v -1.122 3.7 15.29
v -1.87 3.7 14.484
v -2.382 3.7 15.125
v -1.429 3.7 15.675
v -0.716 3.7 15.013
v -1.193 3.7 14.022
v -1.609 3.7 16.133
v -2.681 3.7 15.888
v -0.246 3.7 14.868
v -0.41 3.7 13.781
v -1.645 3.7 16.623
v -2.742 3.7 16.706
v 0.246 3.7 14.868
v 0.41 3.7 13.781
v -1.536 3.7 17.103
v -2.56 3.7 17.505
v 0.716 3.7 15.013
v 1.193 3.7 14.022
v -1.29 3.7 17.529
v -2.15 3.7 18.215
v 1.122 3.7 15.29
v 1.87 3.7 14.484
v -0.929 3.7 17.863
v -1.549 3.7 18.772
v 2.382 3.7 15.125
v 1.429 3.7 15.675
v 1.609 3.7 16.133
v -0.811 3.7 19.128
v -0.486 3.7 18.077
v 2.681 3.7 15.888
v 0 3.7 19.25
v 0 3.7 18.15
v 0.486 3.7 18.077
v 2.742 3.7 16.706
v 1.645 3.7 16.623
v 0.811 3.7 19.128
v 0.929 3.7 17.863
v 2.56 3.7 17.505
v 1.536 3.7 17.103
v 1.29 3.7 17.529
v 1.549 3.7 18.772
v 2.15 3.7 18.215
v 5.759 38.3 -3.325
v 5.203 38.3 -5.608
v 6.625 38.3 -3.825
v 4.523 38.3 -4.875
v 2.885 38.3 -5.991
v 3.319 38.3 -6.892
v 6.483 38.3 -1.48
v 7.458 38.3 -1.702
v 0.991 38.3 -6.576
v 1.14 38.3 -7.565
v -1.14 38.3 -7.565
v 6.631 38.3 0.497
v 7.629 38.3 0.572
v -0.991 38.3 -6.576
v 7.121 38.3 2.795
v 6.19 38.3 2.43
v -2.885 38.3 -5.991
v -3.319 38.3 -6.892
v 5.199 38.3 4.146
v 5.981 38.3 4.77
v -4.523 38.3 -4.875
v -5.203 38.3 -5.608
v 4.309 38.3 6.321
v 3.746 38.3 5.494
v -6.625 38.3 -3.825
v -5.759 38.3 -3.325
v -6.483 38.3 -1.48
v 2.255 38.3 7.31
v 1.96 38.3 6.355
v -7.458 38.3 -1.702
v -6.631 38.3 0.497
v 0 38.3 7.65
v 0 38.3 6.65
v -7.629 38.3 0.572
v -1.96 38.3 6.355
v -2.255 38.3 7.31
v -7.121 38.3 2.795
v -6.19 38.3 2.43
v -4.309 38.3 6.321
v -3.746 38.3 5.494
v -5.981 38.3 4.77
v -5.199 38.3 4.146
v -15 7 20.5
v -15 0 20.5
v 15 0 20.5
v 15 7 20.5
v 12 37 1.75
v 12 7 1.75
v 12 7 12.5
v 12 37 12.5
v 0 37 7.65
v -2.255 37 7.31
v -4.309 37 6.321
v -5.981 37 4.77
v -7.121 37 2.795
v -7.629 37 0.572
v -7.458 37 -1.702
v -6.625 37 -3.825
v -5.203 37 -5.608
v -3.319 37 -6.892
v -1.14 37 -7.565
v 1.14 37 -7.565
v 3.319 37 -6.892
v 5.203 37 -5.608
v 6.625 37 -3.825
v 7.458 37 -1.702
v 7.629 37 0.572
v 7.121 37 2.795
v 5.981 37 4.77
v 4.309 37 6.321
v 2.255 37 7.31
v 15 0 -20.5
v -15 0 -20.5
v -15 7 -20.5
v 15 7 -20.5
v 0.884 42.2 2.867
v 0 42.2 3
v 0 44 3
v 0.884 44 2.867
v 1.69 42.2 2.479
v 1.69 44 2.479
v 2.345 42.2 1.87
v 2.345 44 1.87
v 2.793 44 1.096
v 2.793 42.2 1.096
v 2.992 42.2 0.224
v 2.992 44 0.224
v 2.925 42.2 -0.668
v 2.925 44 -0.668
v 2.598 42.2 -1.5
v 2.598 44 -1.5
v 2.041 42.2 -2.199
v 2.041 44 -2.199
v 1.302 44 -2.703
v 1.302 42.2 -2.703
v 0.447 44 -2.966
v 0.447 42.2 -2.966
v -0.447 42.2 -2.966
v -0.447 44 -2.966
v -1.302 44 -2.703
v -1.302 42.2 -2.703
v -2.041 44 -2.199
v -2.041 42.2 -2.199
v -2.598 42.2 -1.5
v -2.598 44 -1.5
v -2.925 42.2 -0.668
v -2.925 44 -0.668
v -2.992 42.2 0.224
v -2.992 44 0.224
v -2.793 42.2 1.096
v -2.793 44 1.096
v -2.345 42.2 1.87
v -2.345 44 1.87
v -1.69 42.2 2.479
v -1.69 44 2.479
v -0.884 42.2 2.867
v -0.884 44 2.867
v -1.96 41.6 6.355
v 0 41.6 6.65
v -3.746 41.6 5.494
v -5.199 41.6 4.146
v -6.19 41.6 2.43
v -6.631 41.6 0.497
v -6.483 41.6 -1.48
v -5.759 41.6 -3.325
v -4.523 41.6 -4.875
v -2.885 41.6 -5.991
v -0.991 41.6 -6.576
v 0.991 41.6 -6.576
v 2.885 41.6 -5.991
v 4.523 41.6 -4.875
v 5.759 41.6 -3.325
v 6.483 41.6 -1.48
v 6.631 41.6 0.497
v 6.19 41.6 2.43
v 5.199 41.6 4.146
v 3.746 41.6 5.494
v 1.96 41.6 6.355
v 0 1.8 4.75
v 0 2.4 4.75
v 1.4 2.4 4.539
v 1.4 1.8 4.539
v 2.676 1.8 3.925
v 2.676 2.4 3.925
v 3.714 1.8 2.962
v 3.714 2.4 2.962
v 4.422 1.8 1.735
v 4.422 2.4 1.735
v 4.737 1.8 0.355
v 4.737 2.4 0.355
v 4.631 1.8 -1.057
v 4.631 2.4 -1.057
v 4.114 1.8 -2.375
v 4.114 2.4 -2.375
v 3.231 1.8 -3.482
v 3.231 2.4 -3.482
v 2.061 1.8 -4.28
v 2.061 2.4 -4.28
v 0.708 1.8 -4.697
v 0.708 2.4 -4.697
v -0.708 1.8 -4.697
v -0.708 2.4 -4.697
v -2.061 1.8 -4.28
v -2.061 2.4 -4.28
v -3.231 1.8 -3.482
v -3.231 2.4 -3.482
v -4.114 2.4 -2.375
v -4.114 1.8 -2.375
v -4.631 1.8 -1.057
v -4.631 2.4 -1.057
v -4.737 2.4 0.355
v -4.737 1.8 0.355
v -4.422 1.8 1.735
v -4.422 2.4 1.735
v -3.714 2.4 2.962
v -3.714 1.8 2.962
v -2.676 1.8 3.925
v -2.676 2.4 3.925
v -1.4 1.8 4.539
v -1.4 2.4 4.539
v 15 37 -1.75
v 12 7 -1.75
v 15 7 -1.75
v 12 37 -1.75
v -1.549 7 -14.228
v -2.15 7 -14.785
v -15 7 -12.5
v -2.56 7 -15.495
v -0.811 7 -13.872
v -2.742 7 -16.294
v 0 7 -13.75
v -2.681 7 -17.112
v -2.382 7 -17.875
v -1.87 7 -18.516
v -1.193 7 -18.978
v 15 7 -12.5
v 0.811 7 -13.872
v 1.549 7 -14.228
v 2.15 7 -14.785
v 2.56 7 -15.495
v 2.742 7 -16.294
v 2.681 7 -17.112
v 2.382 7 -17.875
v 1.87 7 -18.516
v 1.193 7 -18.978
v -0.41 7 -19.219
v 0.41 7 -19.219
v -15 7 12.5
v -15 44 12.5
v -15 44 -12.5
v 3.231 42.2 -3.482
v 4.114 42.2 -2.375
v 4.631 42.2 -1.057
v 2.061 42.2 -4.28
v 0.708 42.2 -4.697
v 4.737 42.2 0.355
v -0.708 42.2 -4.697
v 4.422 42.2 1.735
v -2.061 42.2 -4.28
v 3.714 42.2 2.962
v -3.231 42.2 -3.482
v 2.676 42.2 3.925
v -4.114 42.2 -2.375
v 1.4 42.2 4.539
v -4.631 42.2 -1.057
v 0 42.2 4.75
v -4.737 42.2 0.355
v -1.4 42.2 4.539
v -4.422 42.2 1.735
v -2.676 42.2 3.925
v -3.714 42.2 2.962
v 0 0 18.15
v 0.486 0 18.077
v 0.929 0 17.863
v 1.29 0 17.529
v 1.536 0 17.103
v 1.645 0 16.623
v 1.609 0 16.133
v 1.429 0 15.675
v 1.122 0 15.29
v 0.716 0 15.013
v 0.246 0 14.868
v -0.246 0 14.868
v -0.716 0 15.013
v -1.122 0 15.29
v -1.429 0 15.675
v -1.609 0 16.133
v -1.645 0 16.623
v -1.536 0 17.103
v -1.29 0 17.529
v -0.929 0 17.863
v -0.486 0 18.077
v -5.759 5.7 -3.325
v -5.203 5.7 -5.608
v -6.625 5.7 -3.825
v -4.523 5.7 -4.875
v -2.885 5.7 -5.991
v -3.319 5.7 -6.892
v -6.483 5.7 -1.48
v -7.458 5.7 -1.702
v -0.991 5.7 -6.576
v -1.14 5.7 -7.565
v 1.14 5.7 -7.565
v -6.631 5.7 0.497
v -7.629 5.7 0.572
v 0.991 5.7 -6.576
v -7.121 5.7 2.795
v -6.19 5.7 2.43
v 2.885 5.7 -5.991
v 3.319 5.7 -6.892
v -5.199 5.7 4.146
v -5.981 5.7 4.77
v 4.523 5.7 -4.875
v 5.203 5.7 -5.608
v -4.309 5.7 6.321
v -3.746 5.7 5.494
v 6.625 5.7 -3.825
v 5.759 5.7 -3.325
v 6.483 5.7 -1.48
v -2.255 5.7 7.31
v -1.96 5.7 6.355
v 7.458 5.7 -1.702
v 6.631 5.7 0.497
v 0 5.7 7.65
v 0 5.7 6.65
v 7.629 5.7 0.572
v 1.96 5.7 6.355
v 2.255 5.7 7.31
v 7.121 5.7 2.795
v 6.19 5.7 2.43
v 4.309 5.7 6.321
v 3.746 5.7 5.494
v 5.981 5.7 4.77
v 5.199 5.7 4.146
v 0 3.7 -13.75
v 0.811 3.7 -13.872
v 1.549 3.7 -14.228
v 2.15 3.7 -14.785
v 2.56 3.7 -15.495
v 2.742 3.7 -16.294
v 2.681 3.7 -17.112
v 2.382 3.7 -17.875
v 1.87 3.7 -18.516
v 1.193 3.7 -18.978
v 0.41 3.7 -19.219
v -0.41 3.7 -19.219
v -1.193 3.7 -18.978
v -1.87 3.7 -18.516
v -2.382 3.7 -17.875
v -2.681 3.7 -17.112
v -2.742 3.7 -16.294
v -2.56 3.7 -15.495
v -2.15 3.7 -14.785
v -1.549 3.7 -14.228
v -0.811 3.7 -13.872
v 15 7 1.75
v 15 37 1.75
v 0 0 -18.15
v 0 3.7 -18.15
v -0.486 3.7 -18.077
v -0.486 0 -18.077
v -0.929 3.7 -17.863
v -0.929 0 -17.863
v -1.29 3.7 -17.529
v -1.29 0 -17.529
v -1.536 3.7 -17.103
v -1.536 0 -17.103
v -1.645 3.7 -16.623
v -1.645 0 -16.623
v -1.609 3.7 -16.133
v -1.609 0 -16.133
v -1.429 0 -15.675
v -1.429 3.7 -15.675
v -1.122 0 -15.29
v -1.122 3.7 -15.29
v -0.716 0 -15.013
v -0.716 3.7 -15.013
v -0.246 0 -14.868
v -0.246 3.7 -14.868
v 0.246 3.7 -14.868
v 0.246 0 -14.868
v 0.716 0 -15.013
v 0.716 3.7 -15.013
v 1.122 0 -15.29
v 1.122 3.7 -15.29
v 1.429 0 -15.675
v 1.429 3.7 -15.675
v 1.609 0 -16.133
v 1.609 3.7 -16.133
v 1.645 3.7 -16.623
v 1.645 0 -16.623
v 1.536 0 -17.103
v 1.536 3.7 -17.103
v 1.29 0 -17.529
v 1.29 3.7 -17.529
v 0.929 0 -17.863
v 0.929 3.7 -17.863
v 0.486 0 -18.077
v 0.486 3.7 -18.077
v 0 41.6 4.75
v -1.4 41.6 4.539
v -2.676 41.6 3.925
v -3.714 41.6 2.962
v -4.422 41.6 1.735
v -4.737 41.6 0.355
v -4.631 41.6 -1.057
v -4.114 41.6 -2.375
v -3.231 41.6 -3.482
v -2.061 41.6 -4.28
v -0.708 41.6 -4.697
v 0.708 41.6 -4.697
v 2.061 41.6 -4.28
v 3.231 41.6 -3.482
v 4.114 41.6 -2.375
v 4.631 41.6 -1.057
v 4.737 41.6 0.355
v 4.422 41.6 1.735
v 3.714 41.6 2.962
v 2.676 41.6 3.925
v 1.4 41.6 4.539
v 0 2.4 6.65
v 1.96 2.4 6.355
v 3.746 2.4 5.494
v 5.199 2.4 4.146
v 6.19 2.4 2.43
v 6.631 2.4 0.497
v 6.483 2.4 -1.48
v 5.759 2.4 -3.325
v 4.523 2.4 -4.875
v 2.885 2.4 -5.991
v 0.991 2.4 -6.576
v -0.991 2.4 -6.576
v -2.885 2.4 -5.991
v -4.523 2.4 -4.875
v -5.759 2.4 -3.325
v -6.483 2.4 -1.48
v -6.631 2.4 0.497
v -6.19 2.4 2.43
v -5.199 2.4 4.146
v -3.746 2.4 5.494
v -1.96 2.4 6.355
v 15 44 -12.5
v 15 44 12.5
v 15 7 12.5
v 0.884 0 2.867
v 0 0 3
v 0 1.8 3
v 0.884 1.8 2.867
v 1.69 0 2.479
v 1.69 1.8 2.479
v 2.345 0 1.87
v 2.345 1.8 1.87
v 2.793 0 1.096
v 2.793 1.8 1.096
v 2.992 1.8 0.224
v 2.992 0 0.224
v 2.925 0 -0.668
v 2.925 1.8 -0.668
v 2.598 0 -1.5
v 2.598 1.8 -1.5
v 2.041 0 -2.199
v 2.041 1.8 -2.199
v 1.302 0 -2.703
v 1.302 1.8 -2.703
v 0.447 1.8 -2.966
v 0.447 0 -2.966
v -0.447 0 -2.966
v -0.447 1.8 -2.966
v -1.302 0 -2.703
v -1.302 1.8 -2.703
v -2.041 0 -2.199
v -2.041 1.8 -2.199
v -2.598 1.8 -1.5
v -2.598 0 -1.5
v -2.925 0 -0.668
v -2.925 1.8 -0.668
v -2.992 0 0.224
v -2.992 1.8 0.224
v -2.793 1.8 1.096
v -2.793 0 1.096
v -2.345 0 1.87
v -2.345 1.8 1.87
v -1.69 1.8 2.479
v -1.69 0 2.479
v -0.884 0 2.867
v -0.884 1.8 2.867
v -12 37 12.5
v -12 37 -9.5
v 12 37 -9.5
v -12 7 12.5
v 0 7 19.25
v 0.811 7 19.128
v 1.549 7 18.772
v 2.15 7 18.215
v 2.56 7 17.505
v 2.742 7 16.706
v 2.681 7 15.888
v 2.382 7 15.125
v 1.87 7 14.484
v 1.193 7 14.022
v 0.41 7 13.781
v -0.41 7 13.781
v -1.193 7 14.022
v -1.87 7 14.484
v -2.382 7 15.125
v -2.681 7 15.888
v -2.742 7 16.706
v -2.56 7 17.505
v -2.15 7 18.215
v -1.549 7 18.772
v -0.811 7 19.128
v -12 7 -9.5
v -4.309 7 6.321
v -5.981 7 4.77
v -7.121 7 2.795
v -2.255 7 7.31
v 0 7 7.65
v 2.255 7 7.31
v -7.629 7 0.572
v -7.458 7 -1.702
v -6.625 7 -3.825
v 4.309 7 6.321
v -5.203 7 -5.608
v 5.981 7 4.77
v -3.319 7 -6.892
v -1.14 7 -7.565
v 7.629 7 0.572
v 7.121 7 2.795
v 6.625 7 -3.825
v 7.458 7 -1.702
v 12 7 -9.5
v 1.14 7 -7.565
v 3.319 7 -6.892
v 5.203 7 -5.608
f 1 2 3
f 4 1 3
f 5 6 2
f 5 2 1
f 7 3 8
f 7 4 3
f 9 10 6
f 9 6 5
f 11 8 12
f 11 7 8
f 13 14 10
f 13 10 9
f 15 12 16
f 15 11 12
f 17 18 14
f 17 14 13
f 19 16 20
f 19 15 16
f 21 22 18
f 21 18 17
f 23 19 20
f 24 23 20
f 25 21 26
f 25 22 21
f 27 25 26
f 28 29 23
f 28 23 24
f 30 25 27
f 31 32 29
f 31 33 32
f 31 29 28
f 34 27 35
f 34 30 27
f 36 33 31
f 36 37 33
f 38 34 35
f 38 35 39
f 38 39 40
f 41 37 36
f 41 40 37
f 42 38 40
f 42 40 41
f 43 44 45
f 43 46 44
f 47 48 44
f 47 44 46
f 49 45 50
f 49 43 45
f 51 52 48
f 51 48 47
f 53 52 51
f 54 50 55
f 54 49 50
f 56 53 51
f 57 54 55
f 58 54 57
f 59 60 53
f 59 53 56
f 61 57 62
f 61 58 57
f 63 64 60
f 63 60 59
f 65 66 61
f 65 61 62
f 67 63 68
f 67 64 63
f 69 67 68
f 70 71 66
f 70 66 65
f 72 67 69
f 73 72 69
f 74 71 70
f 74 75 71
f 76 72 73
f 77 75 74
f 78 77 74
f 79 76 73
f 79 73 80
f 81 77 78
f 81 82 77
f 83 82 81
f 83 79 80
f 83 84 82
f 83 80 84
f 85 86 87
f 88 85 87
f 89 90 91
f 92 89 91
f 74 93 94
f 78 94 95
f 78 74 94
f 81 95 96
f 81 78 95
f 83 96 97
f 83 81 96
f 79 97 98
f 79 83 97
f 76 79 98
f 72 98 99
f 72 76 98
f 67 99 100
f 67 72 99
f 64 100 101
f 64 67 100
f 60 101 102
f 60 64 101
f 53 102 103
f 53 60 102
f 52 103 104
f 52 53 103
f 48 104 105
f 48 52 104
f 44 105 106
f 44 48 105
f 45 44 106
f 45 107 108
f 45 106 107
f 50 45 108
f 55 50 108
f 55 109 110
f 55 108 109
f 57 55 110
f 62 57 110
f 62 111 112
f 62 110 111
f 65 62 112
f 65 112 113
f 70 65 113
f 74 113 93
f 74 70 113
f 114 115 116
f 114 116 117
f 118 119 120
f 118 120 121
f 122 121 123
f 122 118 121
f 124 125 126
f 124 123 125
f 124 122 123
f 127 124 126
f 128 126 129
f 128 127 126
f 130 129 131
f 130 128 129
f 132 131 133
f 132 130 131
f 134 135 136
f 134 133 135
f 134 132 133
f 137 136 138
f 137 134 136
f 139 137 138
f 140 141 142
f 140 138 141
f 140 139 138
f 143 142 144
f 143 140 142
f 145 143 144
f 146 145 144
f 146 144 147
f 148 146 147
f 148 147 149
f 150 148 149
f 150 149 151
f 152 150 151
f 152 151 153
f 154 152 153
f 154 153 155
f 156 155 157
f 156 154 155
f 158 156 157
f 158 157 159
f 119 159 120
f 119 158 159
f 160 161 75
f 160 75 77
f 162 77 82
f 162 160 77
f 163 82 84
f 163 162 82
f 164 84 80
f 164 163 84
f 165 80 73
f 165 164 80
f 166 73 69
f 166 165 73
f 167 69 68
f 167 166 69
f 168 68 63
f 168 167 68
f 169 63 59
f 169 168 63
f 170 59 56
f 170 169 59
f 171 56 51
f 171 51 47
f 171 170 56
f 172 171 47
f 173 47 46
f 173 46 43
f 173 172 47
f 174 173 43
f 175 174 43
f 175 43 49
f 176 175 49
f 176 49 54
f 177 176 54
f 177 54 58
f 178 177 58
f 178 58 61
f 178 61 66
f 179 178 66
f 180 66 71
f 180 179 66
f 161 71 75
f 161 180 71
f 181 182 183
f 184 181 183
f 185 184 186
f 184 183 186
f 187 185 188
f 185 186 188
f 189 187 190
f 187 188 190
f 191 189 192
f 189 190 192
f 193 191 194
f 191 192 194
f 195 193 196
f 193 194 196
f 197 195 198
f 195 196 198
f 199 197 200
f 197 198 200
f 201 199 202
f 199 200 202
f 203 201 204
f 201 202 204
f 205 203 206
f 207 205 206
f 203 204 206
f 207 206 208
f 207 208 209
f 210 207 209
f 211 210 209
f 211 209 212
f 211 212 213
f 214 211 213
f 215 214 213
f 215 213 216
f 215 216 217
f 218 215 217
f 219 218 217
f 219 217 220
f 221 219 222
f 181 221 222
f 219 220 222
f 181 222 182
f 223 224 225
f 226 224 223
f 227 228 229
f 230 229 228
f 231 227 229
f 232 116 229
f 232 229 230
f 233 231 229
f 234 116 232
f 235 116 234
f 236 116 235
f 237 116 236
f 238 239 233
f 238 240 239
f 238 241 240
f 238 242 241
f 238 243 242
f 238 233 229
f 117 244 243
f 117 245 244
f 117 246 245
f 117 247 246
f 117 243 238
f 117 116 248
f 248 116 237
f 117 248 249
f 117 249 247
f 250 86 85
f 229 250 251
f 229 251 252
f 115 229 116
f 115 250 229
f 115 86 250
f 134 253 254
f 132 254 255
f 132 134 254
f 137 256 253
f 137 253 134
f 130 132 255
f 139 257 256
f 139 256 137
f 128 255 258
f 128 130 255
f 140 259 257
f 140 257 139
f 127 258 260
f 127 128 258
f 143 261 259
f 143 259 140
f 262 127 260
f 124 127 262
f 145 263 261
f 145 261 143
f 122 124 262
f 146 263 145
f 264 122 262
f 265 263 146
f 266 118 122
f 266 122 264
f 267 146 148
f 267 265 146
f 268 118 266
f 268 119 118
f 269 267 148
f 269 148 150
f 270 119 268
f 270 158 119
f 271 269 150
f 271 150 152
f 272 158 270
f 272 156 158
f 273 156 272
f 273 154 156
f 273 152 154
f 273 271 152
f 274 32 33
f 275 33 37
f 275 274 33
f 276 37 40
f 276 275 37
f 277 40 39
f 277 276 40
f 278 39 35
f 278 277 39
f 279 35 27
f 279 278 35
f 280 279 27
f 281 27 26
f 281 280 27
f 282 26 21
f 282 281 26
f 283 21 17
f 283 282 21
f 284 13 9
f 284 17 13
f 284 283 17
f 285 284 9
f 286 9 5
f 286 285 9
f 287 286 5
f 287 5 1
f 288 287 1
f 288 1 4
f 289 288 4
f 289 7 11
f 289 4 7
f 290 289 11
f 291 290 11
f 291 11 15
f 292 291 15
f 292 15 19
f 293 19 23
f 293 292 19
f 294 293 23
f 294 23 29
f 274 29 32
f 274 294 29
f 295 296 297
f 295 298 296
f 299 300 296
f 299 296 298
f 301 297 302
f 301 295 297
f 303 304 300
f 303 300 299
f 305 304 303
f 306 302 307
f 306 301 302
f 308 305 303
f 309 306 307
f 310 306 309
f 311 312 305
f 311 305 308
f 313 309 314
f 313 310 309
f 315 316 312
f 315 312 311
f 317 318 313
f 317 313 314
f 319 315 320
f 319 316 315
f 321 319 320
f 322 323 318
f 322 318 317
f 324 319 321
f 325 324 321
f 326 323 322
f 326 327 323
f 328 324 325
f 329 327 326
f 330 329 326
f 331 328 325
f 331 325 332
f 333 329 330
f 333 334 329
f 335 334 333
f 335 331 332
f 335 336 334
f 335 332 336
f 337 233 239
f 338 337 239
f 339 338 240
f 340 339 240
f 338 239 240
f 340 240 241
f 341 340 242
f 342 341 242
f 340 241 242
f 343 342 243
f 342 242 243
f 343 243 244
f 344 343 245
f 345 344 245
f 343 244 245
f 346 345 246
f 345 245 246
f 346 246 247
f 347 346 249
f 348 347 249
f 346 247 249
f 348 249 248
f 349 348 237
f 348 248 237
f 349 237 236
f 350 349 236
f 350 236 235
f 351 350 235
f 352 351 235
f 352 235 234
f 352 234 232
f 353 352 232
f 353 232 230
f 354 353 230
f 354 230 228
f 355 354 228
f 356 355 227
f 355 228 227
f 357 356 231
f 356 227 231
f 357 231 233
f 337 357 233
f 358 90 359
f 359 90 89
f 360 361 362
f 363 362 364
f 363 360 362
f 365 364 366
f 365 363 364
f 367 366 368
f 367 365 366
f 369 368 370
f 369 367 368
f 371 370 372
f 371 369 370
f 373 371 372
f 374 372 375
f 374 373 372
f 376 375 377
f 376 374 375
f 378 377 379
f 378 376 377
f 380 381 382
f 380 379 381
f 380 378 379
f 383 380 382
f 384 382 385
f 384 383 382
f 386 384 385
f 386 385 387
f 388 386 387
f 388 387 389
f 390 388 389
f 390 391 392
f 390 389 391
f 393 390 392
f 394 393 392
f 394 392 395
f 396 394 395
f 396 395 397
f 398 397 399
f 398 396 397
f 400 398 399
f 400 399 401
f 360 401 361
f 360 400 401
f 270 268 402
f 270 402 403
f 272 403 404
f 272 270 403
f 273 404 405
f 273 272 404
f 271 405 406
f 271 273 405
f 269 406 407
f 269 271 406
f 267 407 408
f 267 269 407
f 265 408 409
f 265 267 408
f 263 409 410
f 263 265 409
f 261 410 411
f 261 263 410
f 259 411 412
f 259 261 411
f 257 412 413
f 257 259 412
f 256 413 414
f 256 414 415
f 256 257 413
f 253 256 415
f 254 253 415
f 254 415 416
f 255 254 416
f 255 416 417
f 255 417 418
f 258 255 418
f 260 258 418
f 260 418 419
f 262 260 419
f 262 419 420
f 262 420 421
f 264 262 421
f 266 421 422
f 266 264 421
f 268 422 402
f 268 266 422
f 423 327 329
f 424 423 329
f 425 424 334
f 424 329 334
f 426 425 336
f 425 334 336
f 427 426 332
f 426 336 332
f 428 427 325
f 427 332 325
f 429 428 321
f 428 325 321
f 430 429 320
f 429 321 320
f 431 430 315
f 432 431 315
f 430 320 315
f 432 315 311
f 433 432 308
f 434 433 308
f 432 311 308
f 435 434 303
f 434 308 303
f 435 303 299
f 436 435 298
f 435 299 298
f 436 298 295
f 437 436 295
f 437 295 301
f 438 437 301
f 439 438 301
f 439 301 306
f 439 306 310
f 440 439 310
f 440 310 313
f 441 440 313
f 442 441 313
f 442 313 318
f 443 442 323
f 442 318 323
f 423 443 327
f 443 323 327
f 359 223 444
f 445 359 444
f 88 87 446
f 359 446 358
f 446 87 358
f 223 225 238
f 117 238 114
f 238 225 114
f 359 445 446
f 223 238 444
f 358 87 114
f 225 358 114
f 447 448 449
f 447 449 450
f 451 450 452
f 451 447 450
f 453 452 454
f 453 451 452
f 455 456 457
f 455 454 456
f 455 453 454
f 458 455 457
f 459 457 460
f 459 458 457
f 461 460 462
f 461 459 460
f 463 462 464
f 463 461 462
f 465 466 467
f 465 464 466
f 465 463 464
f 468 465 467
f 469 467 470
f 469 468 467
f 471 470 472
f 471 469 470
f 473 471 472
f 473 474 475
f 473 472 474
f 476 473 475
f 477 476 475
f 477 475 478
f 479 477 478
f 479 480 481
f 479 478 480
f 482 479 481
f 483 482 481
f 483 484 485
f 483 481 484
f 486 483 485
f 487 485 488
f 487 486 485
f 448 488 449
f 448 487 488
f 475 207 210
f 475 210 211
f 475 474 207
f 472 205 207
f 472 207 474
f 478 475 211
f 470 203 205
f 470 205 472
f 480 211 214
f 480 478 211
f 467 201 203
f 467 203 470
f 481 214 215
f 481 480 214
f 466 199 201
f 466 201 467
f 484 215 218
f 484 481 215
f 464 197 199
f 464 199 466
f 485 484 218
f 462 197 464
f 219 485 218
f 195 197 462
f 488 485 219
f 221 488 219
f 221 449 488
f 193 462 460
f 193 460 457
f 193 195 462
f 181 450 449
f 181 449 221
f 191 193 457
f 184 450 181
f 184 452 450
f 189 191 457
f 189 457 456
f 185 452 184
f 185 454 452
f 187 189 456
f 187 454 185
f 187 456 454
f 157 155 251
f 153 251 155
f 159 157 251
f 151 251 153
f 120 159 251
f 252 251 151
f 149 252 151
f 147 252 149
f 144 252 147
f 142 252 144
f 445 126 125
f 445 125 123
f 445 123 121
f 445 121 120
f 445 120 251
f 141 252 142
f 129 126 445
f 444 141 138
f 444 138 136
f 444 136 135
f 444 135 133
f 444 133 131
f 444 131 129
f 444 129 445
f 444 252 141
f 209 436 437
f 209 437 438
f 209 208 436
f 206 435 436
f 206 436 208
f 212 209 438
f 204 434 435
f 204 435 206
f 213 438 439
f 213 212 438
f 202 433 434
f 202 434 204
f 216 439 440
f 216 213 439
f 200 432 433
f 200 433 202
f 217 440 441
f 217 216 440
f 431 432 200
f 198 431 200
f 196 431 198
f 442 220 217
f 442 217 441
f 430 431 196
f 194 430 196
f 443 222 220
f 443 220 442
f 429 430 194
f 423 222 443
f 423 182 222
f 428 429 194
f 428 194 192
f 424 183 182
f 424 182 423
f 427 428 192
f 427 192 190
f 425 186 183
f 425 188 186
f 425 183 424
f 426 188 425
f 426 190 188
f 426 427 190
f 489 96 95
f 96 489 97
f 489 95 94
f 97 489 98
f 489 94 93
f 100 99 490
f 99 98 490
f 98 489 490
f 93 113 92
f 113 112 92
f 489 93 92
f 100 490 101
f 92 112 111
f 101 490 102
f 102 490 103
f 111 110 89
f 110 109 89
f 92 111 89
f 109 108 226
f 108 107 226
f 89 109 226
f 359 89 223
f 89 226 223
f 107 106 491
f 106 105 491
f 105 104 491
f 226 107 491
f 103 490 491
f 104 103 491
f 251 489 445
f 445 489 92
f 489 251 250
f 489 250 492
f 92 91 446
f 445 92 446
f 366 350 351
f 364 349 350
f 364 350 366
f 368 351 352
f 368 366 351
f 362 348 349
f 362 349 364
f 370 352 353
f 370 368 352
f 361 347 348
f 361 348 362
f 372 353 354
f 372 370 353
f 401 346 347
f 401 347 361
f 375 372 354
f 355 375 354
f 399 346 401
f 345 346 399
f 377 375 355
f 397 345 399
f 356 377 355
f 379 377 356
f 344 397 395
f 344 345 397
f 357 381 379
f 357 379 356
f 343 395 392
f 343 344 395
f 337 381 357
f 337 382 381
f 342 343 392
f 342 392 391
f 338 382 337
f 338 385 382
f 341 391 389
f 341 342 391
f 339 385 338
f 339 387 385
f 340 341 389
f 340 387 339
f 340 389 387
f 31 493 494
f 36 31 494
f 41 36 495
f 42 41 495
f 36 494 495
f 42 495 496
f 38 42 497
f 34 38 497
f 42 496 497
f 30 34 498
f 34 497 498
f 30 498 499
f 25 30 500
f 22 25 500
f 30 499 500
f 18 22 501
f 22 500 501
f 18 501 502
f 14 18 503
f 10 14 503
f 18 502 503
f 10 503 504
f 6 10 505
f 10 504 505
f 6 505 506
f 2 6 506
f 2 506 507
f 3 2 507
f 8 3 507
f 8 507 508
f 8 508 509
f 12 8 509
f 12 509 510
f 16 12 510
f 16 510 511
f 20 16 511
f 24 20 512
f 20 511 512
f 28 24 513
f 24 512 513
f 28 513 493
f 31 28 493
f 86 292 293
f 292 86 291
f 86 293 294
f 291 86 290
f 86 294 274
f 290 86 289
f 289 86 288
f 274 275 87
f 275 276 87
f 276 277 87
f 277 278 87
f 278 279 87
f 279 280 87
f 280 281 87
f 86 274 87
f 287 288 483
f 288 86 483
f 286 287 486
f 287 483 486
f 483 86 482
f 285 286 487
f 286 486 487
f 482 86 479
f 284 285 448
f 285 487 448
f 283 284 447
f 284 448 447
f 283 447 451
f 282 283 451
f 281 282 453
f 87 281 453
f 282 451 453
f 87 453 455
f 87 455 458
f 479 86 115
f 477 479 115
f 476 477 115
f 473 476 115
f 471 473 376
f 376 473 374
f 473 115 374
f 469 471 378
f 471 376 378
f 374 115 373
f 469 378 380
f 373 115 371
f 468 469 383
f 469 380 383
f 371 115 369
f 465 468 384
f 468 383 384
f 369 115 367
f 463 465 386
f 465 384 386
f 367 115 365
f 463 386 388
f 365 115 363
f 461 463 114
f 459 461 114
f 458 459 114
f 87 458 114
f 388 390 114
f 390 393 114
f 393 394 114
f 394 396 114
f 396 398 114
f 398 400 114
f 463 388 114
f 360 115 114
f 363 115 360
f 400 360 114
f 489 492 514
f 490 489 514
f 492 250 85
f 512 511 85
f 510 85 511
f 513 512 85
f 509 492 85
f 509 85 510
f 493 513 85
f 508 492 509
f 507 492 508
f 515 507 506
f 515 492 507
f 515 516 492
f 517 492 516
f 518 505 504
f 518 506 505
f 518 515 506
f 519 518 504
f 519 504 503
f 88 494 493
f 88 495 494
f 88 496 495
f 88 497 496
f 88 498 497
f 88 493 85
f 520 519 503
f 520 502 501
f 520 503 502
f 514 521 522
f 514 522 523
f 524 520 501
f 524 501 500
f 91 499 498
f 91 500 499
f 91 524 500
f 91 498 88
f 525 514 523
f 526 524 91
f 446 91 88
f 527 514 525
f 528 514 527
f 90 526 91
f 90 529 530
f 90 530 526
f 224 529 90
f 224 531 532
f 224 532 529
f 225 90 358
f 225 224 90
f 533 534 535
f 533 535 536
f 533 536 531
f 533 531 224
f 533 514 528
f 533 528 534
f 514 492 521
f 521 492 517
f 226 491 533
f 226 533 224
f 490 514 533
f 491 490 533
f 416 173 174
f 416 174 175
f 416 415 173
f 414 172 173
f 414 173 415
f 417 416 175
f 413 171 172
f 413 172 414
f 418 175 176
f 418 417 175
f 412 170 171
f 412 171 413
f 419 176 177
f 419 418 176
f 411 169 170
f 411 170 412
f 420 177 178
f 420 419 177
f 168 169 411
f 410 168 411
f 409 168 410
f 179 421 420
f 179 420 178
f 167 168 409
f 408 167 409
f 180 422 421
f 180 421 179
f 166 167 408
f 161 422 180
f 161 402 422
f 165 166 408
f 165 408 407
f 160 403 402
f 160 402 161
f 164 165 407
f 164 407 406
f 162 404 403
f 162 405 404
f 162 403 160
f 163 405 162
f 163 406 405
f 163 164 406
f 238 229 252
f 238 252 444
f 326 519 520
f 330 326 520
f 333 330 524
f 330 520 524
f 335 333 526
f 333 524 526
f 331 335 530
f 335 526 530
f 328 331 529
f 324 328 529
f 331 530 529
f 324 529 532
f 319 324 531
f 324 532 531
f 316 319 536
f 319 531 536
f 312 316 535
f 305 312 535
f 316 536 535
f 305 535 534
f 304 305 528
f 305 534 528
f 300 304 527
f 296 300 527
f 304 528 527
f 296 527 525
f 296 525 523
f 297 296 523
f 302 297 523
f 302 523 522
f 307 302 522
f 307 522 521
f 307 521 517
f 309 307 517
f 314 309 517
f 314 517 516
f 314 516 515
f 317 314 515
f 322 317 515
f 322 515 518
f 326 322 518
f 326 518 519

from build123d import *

# Parameters (mm, degrees)
SKETCH1_W               = 30
SKETCH1_H               = 25
BOSS_EXTRUDE1_DEPTH     = 7
BOSS_EXTRUDE2_DEPTH     = 30
SKETCH3_W               = 30
SKETCH3_H               = 25
BOSS_EXTRUDE3_DEPTH     = 7
SKETCH4_R               = 7.65
CUT_EXTRUDE1_DEPTH      = 1.3
CUT_EXTRUDE2_START      = -1.3
SKETCH5_R               = 7.65
CUT_EXTRUDE2_DEPTH      = 1.3
SKETCH6_R               = 6.65
CUT_EXTRUDE3_DEPTH      = 3.3
CUT_EXTRUDE4_START      = -3.3
SKETCH7_R               = 6.65
CUT_EXTRUDE4_DEPTH      = 3.3
SKETCH8_R               = 4.75
CUT_EXTRUDE5_DEPTH      = 0.6
CUT_EXTRUDE6_START      = -0.6
SKETCH9_R               = 4.75
CUT_EXTRUDE6_DEPTH      = 0.6
CUT_EXTRUDE7_DEPTH      = 47.498279538
CUT_EXTRUDE7_DEPTH_BACK = 47.498279538
SKETCH10_R              = 3
CUT_EXTRUDE8_DEPTH      = 55.701462503
CUT_EXTRUDE8_DEPTH_BACK = 10.6
SKETCH11_W              = 3.5
SKETCH11_H              = 30
SKETCH12_W              = 30
SKETCH12_H              = 8
SKETCH12_R              = 1.65
BOSS_EXTRUDE4_DEPTH     = 7
SKETCH13_R              = 2.75
CUT_EXTRUDE9_DEPTH      = 3.3


with BuildPart() as part:
    # Sketch1 → Boss-Extrude1 (new body)
    with BuildSketch(Plane(origin=(0, 0, 0), x_dir=(1, 0, 0), z_dir=(0, 1, 0))):
        Rectangle(SKETCH1_W, SKETCH1_H)
    extrude(amount=BOSS_EXTRUDE1_DEPTH)

    # Sketch2 → Boss-Extrude2 (add)
    with BuildSketch(Plane(origin=(0, 7, 0), x_dir=(1, 0, 0), z_dir=(0, 1, 0))):
        Polygon((-15, -12.5), (-12, -12.5), (-12, 9.5), (12, 9.5), (12, -12.5), (15, -12.5), (15, 12.5), (-15, 12.5), align=None)
    extrude(amount=BOSS_EXTRUDE2_DEPTH)

    # Sketch3 → Boss-Extrude3 (add)
    with BuildSketch(Plane(origin=(0, 37, 0), x_dir=(1, 0, 0), z_dir=(0, 1, 0))):
        Rectangle(SKETCH3_W, SKETCH3_H)
    extrude(amount=BOSS_EXTRUDE3_DEPTH)

    # Sketch4 → Cut-Extrude1 (cut)
    with BuildSketch(Plane(origin=(0, 7, 0), x_dir=(1, 0, 0), z_dir=(0, 1, 0))):
        with Locations(Location((0, 0, 0), (0, 0, 270))):
            Circle(SKETCH4_R)
    extrude(amount=-CUT_EXTRUDE1_DEPTH, mode=Mode.SUBTRACT)

    # Sketch5 → Cut-Extrude2 (cut)
    with BuildSketch(Plane.XZ.offset(-37).offset(CUT_EXTRUDE2_START)):
        with Locations(Location((0, 0, 0), (0, 0, 90))):
            Circle(SKETCH5_R)
    extrude(amount=CUT_EXTRUDE2_DEPTH, mode=Mode.SUBTRACT)

    # Sketch6 → Cut-Extrude3 (cut)
    with BuildSketch(Plane(origin=(0, 5.7, 0), x_dir=(1, 0, 0), z_dir=(0, 1, 0))):
        with Locations(Location((0, 0, 0), (0, 0, 270))):
            Circle(SKETCH6_R)
    extrude(amount=-CUT_EXTRUDE3_DEPTH, mode=Mode.SUBTRACT)

    # Sketch7 → Cut-Extrude4 (cut)
    with BuildSketch(Plane.XZ.offset(-38.3).offset(CUT_EXTRUDE4_START)):
        with Locations(Location((0, 0, 0), (0, 0, 90))):
            Circle(SKETCH7_R)
    extrude(amount=CUT_EXTRUDE4_DEPTH, mode=Mode.SUBTRACT)

    # Sketch8 → Cut-Extrude5 (cut)
    with BuildSketch(Plane(origin=(0, 2.4, 0), x_dir=(1, 0, 0), z_dir=(0, 1, 0))):
        with Locations(Location((0, 0, 0), (0, 0, 270))):
            Circle(SKETCH8_R)
    extrude(amount=-CUT_EXTRUDE5_DEPTH, mode=Mode.SUBTRACT)

    # Sketch9 → Cut-Extrude6 (cut)
    with BuildSketch(Plane.XZ.offset(-41.6).offset(CUT_EXTRUDE6_START)):
        with Locations(Location((0, 0, 0), (0, 0, 90))):
            Circle(SKETCH9_R)
    extrude(amount=CUT_EXTRUDE6_DEPTH, mode=Mode.SUBTRACT)

    # Sketch10 → Cut-Extrude7 (cut, two sides: drawn at the far end of the back side and taken through both)
    with BuildSketch(Plane(origin=(0, 1.8, 0), x_dir=(1, 0, 0), z_dir=(0, 1, 0)).offset(-CUT_EXTRUDE7_DEPTH_BACK)):
        with Locations(Location((0, 0, 0), (0, 0, 270))):
            Circle(SKETCH10_R)
    extrude(amount=CUT_EXTRUDE7_DEPTH + CUT_EXTRUDE7_DEPTH_BACK, mode=Mode.SUBTRACT)

    # Sketch11 → Cut-Extrude8 (cut, two sides: drawn at the far end of the back side and taken through both)
    with BuildSketch(Plane(origin=(15, 0, 0), x_dir=(0, 0, -1), z_dir=(1, 0, 0)).offset(-CUT_EXTRUDE8_DEPTH_BACK)):
        with Locations((0, 22)):
            Rectangle(SKETCH11_W, SKETCH11_H)
    extrude(amount=CUT_EXTRUDE8_DEPTH + CUT_EXTRUDE8_DEPTH_BACK, mode=Mode.SUBTRACT)

    # Sketch12 → Boss-Extrude4 (add)
    # profile 1 of 2: a face of its own
    with BuildSketch(Plane(origin=(0, 0, 0), x_dir=(1, 0, 0), z_dir=(0, 1, 0))):
        with Locations((0, -16.5)):
            Rectangle(SKETCH12_W, SKETCH12_H)
        with Locations(Location((0, -16.5, 0), (0, 0, 270))):
            Circle(SKETCH12_R, mode=Mode.SUBTRACT)
    # profile 2 of 2: a face of its own
    with BuildSketch(Plane(origin=(0, 0, 0), x_dir=(1, 0, 0), z_dir=(0, 1, 0))):
        with Locations((0, 16.5)):
            Rectangle(SKETCH12_W, SKETCH12_H)
        with Locations(Location((0, 16.5, 0), (0, 0, 90))):
            Circle(SKETCH12_R, mode=Mode.SUBTRACT)
    extrude(amount=BOSS_EXTRUDE4_DEPTH)

    # Sketch13 → Cut-Extrude9 (cut)
    with BuildSketch(Plane(origin=(0, 7, 0), x_dir=(1, 0, 0), z_dir=(0, 1, 0))):
        with Locations(Location((0, 16.5, 0), (0, 0, 270))):
            Circle(SKETCH13_R)
        with Locations(Location((0, -16.5, 0), (0, 0, 270))):
            Circle(SKETCH13_R)
    extrude(amount=-CUT_EXTRUDE9_DEPTH, mode=Mode.SUBTRACT)


solid = part.part
